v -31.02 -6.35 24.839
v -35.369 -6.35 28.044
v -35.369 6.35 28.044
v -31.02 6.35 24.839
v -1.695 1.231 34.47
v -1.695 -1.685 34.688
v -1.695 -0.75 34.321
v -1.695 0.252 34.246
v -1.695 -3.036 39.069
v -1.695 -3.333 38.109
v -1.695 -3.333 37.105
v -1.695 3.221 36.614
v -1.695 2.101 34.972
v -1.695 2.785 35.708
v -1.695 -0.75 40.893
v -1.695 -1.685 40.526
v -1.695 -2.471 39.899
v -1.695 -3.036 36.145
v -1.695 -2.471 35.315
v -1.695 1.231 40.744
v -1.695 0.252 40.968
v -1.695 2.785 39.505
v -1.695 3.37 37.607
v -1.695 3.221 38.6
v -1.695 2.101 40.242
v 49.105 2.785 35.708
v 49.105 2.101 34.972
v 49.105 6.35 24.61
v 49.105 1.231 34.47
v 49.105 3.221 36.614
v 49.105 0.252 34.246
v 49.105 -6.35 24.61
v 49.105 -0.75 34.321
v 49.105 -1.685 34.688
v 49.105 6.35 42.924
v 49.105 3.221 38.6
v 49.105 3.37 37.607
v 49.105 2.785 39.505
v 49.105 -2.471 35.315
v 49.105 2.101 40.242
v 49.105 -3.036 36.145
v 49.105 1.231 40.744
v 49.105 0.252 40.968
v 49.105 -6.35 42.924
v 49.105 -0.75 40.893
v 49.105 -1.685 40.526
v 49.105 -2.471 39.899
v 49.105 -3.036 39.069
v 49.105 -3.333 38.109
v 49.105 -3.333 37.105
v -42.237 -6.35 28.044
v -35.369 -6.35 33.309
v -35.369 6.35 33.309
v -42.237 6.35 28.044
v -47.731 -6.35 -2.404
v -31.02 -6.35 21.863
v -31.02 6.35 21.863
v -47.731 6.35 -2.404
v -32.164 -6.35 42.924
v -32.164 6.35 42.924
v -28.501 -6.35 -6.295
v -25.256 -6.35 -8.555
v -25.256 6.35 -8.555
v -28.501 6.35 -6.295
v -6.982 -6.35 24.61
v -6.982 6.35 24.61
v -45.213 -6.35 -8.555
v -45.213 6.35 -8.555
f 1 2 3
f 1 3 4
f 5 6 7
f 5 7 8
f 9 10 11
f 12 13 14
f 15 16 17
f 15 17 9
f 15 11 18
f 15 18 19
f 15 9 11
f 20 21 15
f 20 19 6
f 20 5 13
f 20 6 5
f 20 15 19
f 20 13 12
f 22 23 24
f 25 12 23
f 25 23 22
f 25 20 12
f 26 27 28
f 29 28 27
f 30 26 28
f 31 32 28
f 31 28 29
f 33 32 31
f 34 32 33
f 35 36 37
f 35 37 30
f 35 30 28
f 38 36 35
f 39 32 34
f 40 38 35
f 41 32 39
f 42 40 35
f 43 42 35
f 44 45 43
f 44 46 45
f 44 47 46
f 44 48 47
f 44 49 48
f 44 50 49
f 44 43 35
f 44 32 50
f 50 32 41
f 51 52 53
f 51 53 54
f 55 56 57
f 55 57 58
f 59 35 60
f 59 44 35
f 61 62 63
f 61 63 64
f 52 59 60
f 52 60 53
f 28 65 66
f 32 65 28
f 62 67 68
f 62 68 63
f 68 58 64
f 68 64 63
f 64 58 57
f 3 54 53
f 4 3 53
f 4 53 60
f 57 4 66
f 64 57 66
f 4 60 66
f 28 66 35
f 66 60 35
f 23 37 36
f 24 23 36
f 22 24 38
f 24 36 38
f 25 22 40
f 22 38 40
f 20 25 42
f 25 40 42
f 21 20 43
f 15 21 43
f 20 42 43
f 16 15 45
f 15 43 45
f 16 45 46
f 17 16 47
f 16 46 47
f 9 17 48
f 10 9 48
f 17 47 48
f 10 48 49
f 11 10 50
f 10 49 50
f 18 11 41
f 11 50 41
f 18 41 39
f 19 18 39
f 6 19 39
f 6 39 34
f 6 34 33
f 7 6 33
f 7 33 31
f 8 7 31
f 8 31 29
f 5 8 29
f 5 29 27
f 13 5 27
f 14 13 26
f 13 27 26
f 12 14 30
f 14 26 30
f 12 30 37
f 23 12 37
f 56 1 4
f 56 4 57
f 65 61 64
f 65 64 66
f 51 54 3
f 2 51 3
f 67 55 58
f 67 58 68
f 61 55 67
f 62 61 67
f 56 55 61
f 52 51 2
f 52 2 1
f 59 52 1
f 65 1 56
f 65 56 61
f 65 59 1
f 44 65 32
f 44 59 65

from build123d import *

# Parameters (mm, degrees)
F1_DEPTH = 6.35
F2_R     = 3.37023
F3_DEPTH = 50.8


with BuildPart() as f1:
    # F0 (on Front) → F1 (new body, symmetric)
    with BuildSketch(Plane.XZ):
        Polygon((49.104851, 42.923819), (-32.16425, 42.923819), (-35.369229, 33.308882), (-42.23704, 28.043561), (-35.369229, 28.043561), (-31.019615, 24.838584), (-31.019615, 21.862533), (-47.731288, -2.403734), (-45.213088, -8.555476), (-25.255695, -8.555476), (-28.501416, -6.295493), (-6.982275, 24.609657), (49.104851, 24.609657), align=None)
    extrude(amount=F1_DEPTH, both=True)

    # F2 (on face) → F3 (cut)
    with BuildSketch(Plane.YZ.offset(49.104851)):
        with Locations((0, 37.606921)):
            Circle(F2_R)
    extrude(amount=-F3_DEPTH, mode=Mode.SUBTRACT)


solid = f1.part
